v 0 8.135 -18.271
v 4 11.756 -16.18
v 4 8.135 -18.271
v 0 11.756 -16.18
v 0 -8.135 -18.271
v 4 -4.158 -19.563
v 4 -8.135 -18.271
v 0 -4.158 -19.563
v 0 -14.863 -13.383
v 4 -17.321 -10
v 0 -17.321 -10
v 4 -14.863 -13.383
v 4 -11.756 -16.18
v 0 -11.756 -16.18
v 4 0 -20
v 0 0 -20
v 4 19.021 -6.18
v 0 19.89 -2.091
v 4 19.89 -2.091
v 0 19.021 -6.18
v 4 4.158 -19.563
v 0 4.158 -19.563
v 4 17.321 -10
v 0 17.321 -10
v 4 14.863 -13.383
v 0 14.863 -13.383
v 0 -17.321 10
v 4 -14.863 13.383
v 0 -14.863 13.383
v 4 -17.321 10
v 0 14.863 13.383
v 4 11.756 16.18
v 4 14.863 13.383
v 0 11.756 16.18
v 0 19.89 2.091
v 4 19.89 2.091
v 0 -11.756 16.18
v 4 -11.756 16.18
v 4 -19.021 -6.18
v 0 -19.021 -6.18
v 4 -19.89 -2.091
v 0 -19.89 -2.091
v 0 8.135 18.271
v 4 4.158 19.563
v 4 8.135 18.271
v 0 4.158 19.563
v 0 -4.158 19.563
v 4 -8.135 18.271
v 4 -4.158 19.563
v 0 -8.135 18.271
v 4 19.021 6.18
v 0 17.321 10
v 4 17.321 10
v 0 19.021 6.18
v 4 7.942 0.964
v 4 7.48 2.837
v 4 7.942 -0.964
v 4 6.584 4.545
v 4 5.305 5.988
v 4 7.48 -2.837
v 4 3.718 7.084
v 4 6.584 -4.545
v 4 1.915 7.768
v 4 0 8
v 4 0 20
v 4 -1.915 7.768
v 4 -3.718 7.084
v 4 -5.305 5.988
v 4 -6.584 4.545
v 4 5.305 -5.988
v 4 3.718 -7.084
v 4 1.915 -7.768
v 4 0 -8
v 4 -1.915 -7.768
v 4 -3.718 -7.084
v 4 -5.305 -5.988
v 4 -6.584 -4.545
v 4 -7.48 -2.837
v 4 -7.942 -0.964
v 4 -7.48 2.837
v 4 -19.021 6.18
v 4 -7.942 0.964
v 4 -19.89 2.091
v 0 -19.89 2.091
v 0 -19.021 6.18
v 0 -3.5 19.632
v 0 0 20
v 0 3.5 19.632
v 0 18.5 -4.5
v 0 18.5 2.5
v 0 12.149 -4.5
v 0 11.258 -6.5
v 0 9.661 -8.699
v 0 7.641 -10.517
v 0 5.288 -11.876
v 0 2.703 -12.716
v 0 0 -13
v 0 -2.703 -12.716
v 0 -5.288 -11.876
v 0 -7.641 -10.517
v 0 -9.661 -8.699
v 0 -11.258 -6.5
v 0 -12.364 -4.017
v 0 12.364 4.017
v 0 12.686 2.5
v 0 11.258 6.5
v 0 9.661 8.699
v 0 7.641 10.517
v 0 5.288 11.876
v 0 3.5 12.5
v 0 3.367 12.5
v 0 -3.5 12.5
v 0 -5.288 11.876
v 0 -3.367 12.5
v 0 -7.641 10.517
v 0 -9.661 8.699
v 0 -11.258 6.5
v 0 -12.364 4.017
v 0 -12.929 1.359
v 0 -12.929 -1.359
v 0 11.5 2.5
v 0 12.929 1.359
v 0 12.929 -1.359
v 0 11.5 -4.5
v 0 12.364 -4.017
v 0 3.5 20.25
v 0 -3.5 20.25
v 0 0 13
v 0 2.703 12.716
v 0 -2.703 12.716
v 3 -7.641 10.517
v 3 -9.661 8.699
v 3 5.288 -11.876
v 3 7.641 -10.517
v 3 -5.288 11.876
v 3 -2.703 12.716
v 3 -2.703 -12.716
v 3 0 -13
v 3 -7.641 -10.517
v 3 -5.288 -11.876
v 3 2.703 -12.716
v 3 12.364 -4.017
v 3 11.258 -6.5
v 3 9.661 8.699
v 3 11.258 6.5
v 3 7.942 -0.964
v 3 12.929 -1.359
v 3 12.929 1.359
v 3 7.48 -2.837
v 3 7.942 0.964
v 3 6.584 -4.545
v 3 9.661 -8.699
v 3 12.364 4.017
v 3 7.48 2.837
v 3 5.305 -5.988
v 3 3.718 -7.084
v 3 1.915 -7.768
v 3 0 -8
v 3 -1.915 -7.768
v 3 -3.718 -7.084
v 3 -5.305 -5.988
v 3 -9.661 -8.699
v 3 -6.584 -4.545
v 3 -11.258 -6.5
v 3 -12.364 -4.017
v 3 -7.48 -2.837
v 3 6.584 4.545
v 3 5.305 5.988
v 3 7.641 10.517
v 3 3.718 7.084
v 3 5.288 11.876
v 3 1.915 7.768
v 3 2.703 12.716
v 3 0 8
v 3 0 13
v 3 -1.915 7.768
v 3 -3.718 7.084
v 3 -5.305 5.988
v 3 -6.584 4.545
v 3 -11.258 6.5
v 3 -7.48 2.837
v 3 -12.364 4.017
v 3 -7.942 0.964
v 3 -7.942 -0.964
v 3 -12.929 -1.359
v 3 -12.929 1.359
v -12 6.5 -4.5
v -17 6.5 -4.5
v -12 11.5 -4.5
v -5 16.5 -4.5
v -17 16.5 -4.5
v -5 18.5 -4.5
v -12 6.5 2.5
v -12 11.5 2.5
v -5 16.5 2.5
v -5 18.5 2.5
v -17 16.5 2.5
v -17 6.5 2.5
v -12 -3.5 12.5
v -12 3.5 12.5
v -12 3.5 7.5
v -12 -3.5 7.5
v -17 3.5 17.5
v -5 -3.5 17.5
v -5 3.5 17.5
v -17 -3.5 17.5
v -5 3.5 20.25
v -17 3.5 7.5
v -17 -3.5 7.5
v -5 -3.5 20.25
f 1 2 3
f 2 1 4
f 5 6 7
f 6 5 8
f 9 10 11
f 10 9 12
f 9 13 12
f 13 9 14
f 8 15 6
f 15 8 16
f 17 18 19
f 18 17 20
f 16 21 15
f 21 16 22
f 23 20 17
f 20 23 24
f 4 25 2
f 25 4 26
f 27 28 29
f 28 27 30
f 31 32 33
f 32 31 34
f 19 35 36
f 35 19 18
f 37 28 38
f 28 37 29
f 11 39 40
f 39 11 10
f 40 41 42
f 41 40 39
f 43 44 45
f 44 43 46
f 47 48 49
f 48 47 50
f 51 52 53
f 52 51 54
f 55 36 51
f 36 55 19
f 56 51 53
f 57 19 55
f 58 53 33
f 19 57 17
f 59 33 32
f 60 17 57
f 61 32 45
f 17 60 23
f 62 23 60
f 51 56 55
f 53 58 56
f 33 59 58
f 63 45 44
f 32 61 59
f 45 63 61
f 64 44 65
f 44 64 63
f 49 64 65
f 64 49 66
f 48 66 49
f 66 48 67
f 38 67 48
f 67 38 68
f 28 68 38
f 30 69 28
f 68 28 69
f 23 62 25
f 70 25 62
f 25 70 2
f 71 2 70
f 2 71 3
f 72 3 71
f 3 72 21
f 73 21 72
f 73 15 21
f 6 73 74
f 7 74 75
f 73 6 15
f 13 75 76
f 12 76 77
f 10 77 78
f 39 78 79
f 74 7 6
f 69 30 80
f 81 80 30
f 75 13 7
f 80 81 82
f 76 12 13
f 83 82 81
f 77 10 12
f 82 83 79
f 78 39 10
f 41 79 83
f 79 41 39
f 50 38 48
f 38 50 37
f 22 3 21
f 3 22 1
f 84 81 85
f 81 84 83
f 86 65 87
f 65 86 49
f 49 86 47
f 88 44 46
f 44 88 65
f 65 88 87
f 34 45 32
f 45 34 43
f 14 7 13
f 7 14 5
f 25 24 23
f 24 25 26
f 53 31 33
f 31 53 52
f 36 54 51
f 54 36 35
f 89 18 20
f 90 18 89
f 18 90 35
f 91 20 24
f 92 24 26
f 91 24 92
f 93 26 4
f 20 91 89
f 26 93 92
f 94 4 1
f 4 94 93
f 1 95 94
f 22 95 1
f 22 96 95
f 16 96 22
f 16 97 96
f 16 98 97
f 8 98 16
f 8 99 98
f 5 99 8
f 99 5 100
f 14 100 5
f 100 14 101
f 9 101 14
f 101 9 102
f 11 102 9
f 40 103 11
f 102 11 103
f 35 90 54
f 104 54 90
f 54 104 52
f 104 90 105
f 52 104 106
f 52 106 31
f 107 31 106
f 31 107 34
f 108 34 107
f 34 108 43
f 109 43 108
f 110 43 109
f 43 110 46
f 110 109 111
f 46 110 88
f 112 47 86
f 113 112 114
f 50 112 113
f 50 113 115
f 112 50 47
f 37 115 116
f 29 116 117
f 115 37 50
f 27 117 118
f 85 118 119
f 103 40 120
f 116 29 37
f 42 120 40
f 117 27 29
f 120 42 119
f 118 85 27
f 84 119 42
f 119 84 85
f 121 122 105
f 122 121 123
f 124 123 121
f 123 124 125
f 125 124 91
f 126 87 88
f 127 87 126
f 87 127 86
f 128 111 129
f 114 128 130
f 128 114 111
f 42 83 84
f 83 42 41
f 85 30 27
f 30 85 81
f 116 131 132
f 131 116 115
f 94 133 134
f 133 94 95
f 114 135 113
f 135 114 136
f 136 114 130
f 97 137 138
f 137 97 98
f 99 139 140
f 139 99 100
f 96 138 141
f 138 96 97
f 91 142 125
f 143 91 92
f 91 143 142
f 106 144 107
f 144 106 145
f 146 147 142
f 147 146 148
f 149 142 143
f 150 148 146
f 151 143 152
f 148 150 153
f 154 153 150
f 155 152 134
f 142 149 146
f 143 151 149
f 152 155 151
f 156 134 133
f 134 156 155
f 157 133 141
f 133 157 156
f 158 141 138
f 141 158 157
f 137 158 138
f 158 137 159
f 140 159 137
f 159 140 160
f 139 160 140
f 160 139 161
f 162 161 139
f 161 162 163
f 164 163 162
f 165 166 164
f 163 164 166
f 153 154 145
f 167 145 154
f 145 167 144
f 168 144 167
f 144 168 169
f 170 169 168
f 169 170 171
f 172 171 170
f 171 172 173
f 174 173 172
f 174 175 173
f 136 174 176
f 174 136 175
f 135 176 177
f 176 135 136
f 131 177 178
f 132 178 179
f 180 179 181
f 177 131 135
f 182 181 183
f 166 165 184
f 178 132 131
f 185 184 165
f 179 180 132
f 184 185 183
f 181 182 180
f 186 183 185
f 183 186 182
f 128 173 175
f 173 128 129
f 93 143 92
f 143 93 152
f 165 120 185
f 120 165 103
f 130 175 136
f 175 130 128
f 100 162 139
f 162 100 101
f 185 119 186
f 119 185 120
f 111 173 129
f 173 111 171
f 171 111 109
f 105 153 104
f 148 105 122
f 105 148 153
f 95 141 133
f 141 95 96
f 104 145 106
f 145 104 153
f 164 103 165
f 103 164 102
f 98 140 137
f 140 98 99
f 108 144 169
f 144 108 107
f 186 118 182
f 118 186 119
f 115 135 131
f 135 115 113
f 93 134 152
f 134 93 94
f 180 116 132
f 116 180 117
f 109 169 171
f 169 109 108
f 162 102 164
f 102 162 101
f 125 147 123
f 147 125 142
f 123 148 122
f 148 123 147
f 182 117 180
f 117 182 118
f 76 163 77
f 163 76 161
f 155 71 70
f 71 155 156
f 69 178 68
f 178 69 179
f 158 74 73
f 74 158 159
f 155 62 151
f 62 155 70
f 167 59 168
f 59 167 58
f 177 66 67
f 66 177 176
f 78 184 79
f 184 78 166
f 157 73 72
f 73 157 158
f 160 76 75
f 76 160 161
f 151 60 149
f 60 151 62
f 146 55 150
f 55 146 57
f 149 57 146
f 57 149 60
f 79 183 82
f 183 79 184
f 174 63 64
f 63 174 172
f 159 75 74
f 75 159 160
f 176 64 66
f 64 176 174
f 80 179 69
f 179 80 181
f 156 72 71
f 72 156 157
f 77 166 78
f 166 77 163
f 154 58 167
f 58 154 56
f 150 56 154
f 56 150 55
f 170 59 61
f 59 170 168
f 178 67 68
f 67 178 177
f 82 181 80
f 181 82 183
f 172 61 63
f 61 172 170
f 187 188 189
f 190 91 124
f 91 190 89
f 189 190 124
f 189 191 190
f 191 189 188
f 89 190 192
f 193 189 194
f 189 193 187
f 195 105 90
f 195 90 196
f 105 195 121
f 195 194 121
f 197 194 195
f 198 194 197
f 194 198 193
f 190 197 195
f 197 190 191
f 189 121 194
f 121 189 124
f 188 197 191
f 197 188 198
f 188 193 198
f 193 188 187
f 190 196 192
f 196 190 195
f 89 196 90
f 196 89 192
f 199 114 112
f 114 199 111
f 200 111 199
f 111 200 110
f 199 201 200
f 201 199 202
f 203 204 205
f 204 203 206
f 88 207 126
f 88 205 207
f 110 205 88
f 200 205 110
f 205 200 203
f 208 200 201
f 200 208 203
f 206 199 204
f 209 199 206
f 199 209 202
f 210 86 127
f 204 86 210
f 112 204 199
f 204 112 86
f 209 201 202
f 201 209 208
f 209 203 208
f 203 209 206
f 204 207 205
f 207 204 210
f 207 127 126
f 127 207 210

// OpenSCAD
//goggles
//union(){}
//intersection(){
//cylinder(height, r1, r2, center=true/false)
//cube([,,])

//focal cone
tip_radius = 20;
tip_thickness = 4;
centre_radius = 32;
wall_thickness = 4;
tip_length = 0; //akin to distance between eye and mounted lens

//lens
seating_depth = 5;
lens_radius = 13;

//camera aperture
aperture_radius = 8;

//mount details
phone_mount_location = 15;
mount_width = 7;
mount_depth =5;

//phone details
phone_depth = 12;
mount_height = phone_depth;
claw_length = 10;
claw_depth = mount_depth;
base_depth = tip_radius - lens_radius;

union(){

difference(){

//end disk
translate([tip_length,0,0]) rotate([90,90,90]) cylinder(tip_thickness,tip_radius,tip_radius);

//lens inset
translate([tip_length-tip_thickness/2,0,0]) rotate([90,90,90]) cylinder(seating_depth,lens_radius,lens_radius);

//camera aperture
translate([tip_length-tip_thickness/2,0,0]) rotate([90,90,90]) cylinder(10,aperture_radius,aperture_radius);

}//closes difference for lens mount

translate([tip_length-mount_height,phone_mount_location-mount_width/2,mount_depth/2]) rotate([90,90,90]) cube([mount_width, mount_depth,mount_height]);
translate([tip_length-mount_height-claw_depth,phone_mount_location-mount_width/2-claw_length/2,mount_depth/2]) rotate([90,90,90]) cube([mount_width, claw_length,claw_depth]);
translate([tip_length-mount_depth,phone_mount_location-base_depth/2,mount_depth/2]) rotate([90,90,90]) cube([mount_width, base_depth,claw_depth]);


translate([tip_length-mount_height,-mount_width/2,phone_mount_location+mount_depth/2]) rotate([90,90,90]) cube([mount_depth, mount_width,mount_height]);
translate([tip_length-mount_height-claw_depth,-mount_width/2,phone_mount_location+mount_depth/2]) rotate([90,90,90]) cube([ claw_length,mount_width, claw_depth]);
translate([tip_length-mount_depth,-mount_width/2,phone_mount_location+0.75*base_depth]) rotate([90,90,90]) cube([mount_width, base_depth,claw_depth]);

}//closes union with phone holder
